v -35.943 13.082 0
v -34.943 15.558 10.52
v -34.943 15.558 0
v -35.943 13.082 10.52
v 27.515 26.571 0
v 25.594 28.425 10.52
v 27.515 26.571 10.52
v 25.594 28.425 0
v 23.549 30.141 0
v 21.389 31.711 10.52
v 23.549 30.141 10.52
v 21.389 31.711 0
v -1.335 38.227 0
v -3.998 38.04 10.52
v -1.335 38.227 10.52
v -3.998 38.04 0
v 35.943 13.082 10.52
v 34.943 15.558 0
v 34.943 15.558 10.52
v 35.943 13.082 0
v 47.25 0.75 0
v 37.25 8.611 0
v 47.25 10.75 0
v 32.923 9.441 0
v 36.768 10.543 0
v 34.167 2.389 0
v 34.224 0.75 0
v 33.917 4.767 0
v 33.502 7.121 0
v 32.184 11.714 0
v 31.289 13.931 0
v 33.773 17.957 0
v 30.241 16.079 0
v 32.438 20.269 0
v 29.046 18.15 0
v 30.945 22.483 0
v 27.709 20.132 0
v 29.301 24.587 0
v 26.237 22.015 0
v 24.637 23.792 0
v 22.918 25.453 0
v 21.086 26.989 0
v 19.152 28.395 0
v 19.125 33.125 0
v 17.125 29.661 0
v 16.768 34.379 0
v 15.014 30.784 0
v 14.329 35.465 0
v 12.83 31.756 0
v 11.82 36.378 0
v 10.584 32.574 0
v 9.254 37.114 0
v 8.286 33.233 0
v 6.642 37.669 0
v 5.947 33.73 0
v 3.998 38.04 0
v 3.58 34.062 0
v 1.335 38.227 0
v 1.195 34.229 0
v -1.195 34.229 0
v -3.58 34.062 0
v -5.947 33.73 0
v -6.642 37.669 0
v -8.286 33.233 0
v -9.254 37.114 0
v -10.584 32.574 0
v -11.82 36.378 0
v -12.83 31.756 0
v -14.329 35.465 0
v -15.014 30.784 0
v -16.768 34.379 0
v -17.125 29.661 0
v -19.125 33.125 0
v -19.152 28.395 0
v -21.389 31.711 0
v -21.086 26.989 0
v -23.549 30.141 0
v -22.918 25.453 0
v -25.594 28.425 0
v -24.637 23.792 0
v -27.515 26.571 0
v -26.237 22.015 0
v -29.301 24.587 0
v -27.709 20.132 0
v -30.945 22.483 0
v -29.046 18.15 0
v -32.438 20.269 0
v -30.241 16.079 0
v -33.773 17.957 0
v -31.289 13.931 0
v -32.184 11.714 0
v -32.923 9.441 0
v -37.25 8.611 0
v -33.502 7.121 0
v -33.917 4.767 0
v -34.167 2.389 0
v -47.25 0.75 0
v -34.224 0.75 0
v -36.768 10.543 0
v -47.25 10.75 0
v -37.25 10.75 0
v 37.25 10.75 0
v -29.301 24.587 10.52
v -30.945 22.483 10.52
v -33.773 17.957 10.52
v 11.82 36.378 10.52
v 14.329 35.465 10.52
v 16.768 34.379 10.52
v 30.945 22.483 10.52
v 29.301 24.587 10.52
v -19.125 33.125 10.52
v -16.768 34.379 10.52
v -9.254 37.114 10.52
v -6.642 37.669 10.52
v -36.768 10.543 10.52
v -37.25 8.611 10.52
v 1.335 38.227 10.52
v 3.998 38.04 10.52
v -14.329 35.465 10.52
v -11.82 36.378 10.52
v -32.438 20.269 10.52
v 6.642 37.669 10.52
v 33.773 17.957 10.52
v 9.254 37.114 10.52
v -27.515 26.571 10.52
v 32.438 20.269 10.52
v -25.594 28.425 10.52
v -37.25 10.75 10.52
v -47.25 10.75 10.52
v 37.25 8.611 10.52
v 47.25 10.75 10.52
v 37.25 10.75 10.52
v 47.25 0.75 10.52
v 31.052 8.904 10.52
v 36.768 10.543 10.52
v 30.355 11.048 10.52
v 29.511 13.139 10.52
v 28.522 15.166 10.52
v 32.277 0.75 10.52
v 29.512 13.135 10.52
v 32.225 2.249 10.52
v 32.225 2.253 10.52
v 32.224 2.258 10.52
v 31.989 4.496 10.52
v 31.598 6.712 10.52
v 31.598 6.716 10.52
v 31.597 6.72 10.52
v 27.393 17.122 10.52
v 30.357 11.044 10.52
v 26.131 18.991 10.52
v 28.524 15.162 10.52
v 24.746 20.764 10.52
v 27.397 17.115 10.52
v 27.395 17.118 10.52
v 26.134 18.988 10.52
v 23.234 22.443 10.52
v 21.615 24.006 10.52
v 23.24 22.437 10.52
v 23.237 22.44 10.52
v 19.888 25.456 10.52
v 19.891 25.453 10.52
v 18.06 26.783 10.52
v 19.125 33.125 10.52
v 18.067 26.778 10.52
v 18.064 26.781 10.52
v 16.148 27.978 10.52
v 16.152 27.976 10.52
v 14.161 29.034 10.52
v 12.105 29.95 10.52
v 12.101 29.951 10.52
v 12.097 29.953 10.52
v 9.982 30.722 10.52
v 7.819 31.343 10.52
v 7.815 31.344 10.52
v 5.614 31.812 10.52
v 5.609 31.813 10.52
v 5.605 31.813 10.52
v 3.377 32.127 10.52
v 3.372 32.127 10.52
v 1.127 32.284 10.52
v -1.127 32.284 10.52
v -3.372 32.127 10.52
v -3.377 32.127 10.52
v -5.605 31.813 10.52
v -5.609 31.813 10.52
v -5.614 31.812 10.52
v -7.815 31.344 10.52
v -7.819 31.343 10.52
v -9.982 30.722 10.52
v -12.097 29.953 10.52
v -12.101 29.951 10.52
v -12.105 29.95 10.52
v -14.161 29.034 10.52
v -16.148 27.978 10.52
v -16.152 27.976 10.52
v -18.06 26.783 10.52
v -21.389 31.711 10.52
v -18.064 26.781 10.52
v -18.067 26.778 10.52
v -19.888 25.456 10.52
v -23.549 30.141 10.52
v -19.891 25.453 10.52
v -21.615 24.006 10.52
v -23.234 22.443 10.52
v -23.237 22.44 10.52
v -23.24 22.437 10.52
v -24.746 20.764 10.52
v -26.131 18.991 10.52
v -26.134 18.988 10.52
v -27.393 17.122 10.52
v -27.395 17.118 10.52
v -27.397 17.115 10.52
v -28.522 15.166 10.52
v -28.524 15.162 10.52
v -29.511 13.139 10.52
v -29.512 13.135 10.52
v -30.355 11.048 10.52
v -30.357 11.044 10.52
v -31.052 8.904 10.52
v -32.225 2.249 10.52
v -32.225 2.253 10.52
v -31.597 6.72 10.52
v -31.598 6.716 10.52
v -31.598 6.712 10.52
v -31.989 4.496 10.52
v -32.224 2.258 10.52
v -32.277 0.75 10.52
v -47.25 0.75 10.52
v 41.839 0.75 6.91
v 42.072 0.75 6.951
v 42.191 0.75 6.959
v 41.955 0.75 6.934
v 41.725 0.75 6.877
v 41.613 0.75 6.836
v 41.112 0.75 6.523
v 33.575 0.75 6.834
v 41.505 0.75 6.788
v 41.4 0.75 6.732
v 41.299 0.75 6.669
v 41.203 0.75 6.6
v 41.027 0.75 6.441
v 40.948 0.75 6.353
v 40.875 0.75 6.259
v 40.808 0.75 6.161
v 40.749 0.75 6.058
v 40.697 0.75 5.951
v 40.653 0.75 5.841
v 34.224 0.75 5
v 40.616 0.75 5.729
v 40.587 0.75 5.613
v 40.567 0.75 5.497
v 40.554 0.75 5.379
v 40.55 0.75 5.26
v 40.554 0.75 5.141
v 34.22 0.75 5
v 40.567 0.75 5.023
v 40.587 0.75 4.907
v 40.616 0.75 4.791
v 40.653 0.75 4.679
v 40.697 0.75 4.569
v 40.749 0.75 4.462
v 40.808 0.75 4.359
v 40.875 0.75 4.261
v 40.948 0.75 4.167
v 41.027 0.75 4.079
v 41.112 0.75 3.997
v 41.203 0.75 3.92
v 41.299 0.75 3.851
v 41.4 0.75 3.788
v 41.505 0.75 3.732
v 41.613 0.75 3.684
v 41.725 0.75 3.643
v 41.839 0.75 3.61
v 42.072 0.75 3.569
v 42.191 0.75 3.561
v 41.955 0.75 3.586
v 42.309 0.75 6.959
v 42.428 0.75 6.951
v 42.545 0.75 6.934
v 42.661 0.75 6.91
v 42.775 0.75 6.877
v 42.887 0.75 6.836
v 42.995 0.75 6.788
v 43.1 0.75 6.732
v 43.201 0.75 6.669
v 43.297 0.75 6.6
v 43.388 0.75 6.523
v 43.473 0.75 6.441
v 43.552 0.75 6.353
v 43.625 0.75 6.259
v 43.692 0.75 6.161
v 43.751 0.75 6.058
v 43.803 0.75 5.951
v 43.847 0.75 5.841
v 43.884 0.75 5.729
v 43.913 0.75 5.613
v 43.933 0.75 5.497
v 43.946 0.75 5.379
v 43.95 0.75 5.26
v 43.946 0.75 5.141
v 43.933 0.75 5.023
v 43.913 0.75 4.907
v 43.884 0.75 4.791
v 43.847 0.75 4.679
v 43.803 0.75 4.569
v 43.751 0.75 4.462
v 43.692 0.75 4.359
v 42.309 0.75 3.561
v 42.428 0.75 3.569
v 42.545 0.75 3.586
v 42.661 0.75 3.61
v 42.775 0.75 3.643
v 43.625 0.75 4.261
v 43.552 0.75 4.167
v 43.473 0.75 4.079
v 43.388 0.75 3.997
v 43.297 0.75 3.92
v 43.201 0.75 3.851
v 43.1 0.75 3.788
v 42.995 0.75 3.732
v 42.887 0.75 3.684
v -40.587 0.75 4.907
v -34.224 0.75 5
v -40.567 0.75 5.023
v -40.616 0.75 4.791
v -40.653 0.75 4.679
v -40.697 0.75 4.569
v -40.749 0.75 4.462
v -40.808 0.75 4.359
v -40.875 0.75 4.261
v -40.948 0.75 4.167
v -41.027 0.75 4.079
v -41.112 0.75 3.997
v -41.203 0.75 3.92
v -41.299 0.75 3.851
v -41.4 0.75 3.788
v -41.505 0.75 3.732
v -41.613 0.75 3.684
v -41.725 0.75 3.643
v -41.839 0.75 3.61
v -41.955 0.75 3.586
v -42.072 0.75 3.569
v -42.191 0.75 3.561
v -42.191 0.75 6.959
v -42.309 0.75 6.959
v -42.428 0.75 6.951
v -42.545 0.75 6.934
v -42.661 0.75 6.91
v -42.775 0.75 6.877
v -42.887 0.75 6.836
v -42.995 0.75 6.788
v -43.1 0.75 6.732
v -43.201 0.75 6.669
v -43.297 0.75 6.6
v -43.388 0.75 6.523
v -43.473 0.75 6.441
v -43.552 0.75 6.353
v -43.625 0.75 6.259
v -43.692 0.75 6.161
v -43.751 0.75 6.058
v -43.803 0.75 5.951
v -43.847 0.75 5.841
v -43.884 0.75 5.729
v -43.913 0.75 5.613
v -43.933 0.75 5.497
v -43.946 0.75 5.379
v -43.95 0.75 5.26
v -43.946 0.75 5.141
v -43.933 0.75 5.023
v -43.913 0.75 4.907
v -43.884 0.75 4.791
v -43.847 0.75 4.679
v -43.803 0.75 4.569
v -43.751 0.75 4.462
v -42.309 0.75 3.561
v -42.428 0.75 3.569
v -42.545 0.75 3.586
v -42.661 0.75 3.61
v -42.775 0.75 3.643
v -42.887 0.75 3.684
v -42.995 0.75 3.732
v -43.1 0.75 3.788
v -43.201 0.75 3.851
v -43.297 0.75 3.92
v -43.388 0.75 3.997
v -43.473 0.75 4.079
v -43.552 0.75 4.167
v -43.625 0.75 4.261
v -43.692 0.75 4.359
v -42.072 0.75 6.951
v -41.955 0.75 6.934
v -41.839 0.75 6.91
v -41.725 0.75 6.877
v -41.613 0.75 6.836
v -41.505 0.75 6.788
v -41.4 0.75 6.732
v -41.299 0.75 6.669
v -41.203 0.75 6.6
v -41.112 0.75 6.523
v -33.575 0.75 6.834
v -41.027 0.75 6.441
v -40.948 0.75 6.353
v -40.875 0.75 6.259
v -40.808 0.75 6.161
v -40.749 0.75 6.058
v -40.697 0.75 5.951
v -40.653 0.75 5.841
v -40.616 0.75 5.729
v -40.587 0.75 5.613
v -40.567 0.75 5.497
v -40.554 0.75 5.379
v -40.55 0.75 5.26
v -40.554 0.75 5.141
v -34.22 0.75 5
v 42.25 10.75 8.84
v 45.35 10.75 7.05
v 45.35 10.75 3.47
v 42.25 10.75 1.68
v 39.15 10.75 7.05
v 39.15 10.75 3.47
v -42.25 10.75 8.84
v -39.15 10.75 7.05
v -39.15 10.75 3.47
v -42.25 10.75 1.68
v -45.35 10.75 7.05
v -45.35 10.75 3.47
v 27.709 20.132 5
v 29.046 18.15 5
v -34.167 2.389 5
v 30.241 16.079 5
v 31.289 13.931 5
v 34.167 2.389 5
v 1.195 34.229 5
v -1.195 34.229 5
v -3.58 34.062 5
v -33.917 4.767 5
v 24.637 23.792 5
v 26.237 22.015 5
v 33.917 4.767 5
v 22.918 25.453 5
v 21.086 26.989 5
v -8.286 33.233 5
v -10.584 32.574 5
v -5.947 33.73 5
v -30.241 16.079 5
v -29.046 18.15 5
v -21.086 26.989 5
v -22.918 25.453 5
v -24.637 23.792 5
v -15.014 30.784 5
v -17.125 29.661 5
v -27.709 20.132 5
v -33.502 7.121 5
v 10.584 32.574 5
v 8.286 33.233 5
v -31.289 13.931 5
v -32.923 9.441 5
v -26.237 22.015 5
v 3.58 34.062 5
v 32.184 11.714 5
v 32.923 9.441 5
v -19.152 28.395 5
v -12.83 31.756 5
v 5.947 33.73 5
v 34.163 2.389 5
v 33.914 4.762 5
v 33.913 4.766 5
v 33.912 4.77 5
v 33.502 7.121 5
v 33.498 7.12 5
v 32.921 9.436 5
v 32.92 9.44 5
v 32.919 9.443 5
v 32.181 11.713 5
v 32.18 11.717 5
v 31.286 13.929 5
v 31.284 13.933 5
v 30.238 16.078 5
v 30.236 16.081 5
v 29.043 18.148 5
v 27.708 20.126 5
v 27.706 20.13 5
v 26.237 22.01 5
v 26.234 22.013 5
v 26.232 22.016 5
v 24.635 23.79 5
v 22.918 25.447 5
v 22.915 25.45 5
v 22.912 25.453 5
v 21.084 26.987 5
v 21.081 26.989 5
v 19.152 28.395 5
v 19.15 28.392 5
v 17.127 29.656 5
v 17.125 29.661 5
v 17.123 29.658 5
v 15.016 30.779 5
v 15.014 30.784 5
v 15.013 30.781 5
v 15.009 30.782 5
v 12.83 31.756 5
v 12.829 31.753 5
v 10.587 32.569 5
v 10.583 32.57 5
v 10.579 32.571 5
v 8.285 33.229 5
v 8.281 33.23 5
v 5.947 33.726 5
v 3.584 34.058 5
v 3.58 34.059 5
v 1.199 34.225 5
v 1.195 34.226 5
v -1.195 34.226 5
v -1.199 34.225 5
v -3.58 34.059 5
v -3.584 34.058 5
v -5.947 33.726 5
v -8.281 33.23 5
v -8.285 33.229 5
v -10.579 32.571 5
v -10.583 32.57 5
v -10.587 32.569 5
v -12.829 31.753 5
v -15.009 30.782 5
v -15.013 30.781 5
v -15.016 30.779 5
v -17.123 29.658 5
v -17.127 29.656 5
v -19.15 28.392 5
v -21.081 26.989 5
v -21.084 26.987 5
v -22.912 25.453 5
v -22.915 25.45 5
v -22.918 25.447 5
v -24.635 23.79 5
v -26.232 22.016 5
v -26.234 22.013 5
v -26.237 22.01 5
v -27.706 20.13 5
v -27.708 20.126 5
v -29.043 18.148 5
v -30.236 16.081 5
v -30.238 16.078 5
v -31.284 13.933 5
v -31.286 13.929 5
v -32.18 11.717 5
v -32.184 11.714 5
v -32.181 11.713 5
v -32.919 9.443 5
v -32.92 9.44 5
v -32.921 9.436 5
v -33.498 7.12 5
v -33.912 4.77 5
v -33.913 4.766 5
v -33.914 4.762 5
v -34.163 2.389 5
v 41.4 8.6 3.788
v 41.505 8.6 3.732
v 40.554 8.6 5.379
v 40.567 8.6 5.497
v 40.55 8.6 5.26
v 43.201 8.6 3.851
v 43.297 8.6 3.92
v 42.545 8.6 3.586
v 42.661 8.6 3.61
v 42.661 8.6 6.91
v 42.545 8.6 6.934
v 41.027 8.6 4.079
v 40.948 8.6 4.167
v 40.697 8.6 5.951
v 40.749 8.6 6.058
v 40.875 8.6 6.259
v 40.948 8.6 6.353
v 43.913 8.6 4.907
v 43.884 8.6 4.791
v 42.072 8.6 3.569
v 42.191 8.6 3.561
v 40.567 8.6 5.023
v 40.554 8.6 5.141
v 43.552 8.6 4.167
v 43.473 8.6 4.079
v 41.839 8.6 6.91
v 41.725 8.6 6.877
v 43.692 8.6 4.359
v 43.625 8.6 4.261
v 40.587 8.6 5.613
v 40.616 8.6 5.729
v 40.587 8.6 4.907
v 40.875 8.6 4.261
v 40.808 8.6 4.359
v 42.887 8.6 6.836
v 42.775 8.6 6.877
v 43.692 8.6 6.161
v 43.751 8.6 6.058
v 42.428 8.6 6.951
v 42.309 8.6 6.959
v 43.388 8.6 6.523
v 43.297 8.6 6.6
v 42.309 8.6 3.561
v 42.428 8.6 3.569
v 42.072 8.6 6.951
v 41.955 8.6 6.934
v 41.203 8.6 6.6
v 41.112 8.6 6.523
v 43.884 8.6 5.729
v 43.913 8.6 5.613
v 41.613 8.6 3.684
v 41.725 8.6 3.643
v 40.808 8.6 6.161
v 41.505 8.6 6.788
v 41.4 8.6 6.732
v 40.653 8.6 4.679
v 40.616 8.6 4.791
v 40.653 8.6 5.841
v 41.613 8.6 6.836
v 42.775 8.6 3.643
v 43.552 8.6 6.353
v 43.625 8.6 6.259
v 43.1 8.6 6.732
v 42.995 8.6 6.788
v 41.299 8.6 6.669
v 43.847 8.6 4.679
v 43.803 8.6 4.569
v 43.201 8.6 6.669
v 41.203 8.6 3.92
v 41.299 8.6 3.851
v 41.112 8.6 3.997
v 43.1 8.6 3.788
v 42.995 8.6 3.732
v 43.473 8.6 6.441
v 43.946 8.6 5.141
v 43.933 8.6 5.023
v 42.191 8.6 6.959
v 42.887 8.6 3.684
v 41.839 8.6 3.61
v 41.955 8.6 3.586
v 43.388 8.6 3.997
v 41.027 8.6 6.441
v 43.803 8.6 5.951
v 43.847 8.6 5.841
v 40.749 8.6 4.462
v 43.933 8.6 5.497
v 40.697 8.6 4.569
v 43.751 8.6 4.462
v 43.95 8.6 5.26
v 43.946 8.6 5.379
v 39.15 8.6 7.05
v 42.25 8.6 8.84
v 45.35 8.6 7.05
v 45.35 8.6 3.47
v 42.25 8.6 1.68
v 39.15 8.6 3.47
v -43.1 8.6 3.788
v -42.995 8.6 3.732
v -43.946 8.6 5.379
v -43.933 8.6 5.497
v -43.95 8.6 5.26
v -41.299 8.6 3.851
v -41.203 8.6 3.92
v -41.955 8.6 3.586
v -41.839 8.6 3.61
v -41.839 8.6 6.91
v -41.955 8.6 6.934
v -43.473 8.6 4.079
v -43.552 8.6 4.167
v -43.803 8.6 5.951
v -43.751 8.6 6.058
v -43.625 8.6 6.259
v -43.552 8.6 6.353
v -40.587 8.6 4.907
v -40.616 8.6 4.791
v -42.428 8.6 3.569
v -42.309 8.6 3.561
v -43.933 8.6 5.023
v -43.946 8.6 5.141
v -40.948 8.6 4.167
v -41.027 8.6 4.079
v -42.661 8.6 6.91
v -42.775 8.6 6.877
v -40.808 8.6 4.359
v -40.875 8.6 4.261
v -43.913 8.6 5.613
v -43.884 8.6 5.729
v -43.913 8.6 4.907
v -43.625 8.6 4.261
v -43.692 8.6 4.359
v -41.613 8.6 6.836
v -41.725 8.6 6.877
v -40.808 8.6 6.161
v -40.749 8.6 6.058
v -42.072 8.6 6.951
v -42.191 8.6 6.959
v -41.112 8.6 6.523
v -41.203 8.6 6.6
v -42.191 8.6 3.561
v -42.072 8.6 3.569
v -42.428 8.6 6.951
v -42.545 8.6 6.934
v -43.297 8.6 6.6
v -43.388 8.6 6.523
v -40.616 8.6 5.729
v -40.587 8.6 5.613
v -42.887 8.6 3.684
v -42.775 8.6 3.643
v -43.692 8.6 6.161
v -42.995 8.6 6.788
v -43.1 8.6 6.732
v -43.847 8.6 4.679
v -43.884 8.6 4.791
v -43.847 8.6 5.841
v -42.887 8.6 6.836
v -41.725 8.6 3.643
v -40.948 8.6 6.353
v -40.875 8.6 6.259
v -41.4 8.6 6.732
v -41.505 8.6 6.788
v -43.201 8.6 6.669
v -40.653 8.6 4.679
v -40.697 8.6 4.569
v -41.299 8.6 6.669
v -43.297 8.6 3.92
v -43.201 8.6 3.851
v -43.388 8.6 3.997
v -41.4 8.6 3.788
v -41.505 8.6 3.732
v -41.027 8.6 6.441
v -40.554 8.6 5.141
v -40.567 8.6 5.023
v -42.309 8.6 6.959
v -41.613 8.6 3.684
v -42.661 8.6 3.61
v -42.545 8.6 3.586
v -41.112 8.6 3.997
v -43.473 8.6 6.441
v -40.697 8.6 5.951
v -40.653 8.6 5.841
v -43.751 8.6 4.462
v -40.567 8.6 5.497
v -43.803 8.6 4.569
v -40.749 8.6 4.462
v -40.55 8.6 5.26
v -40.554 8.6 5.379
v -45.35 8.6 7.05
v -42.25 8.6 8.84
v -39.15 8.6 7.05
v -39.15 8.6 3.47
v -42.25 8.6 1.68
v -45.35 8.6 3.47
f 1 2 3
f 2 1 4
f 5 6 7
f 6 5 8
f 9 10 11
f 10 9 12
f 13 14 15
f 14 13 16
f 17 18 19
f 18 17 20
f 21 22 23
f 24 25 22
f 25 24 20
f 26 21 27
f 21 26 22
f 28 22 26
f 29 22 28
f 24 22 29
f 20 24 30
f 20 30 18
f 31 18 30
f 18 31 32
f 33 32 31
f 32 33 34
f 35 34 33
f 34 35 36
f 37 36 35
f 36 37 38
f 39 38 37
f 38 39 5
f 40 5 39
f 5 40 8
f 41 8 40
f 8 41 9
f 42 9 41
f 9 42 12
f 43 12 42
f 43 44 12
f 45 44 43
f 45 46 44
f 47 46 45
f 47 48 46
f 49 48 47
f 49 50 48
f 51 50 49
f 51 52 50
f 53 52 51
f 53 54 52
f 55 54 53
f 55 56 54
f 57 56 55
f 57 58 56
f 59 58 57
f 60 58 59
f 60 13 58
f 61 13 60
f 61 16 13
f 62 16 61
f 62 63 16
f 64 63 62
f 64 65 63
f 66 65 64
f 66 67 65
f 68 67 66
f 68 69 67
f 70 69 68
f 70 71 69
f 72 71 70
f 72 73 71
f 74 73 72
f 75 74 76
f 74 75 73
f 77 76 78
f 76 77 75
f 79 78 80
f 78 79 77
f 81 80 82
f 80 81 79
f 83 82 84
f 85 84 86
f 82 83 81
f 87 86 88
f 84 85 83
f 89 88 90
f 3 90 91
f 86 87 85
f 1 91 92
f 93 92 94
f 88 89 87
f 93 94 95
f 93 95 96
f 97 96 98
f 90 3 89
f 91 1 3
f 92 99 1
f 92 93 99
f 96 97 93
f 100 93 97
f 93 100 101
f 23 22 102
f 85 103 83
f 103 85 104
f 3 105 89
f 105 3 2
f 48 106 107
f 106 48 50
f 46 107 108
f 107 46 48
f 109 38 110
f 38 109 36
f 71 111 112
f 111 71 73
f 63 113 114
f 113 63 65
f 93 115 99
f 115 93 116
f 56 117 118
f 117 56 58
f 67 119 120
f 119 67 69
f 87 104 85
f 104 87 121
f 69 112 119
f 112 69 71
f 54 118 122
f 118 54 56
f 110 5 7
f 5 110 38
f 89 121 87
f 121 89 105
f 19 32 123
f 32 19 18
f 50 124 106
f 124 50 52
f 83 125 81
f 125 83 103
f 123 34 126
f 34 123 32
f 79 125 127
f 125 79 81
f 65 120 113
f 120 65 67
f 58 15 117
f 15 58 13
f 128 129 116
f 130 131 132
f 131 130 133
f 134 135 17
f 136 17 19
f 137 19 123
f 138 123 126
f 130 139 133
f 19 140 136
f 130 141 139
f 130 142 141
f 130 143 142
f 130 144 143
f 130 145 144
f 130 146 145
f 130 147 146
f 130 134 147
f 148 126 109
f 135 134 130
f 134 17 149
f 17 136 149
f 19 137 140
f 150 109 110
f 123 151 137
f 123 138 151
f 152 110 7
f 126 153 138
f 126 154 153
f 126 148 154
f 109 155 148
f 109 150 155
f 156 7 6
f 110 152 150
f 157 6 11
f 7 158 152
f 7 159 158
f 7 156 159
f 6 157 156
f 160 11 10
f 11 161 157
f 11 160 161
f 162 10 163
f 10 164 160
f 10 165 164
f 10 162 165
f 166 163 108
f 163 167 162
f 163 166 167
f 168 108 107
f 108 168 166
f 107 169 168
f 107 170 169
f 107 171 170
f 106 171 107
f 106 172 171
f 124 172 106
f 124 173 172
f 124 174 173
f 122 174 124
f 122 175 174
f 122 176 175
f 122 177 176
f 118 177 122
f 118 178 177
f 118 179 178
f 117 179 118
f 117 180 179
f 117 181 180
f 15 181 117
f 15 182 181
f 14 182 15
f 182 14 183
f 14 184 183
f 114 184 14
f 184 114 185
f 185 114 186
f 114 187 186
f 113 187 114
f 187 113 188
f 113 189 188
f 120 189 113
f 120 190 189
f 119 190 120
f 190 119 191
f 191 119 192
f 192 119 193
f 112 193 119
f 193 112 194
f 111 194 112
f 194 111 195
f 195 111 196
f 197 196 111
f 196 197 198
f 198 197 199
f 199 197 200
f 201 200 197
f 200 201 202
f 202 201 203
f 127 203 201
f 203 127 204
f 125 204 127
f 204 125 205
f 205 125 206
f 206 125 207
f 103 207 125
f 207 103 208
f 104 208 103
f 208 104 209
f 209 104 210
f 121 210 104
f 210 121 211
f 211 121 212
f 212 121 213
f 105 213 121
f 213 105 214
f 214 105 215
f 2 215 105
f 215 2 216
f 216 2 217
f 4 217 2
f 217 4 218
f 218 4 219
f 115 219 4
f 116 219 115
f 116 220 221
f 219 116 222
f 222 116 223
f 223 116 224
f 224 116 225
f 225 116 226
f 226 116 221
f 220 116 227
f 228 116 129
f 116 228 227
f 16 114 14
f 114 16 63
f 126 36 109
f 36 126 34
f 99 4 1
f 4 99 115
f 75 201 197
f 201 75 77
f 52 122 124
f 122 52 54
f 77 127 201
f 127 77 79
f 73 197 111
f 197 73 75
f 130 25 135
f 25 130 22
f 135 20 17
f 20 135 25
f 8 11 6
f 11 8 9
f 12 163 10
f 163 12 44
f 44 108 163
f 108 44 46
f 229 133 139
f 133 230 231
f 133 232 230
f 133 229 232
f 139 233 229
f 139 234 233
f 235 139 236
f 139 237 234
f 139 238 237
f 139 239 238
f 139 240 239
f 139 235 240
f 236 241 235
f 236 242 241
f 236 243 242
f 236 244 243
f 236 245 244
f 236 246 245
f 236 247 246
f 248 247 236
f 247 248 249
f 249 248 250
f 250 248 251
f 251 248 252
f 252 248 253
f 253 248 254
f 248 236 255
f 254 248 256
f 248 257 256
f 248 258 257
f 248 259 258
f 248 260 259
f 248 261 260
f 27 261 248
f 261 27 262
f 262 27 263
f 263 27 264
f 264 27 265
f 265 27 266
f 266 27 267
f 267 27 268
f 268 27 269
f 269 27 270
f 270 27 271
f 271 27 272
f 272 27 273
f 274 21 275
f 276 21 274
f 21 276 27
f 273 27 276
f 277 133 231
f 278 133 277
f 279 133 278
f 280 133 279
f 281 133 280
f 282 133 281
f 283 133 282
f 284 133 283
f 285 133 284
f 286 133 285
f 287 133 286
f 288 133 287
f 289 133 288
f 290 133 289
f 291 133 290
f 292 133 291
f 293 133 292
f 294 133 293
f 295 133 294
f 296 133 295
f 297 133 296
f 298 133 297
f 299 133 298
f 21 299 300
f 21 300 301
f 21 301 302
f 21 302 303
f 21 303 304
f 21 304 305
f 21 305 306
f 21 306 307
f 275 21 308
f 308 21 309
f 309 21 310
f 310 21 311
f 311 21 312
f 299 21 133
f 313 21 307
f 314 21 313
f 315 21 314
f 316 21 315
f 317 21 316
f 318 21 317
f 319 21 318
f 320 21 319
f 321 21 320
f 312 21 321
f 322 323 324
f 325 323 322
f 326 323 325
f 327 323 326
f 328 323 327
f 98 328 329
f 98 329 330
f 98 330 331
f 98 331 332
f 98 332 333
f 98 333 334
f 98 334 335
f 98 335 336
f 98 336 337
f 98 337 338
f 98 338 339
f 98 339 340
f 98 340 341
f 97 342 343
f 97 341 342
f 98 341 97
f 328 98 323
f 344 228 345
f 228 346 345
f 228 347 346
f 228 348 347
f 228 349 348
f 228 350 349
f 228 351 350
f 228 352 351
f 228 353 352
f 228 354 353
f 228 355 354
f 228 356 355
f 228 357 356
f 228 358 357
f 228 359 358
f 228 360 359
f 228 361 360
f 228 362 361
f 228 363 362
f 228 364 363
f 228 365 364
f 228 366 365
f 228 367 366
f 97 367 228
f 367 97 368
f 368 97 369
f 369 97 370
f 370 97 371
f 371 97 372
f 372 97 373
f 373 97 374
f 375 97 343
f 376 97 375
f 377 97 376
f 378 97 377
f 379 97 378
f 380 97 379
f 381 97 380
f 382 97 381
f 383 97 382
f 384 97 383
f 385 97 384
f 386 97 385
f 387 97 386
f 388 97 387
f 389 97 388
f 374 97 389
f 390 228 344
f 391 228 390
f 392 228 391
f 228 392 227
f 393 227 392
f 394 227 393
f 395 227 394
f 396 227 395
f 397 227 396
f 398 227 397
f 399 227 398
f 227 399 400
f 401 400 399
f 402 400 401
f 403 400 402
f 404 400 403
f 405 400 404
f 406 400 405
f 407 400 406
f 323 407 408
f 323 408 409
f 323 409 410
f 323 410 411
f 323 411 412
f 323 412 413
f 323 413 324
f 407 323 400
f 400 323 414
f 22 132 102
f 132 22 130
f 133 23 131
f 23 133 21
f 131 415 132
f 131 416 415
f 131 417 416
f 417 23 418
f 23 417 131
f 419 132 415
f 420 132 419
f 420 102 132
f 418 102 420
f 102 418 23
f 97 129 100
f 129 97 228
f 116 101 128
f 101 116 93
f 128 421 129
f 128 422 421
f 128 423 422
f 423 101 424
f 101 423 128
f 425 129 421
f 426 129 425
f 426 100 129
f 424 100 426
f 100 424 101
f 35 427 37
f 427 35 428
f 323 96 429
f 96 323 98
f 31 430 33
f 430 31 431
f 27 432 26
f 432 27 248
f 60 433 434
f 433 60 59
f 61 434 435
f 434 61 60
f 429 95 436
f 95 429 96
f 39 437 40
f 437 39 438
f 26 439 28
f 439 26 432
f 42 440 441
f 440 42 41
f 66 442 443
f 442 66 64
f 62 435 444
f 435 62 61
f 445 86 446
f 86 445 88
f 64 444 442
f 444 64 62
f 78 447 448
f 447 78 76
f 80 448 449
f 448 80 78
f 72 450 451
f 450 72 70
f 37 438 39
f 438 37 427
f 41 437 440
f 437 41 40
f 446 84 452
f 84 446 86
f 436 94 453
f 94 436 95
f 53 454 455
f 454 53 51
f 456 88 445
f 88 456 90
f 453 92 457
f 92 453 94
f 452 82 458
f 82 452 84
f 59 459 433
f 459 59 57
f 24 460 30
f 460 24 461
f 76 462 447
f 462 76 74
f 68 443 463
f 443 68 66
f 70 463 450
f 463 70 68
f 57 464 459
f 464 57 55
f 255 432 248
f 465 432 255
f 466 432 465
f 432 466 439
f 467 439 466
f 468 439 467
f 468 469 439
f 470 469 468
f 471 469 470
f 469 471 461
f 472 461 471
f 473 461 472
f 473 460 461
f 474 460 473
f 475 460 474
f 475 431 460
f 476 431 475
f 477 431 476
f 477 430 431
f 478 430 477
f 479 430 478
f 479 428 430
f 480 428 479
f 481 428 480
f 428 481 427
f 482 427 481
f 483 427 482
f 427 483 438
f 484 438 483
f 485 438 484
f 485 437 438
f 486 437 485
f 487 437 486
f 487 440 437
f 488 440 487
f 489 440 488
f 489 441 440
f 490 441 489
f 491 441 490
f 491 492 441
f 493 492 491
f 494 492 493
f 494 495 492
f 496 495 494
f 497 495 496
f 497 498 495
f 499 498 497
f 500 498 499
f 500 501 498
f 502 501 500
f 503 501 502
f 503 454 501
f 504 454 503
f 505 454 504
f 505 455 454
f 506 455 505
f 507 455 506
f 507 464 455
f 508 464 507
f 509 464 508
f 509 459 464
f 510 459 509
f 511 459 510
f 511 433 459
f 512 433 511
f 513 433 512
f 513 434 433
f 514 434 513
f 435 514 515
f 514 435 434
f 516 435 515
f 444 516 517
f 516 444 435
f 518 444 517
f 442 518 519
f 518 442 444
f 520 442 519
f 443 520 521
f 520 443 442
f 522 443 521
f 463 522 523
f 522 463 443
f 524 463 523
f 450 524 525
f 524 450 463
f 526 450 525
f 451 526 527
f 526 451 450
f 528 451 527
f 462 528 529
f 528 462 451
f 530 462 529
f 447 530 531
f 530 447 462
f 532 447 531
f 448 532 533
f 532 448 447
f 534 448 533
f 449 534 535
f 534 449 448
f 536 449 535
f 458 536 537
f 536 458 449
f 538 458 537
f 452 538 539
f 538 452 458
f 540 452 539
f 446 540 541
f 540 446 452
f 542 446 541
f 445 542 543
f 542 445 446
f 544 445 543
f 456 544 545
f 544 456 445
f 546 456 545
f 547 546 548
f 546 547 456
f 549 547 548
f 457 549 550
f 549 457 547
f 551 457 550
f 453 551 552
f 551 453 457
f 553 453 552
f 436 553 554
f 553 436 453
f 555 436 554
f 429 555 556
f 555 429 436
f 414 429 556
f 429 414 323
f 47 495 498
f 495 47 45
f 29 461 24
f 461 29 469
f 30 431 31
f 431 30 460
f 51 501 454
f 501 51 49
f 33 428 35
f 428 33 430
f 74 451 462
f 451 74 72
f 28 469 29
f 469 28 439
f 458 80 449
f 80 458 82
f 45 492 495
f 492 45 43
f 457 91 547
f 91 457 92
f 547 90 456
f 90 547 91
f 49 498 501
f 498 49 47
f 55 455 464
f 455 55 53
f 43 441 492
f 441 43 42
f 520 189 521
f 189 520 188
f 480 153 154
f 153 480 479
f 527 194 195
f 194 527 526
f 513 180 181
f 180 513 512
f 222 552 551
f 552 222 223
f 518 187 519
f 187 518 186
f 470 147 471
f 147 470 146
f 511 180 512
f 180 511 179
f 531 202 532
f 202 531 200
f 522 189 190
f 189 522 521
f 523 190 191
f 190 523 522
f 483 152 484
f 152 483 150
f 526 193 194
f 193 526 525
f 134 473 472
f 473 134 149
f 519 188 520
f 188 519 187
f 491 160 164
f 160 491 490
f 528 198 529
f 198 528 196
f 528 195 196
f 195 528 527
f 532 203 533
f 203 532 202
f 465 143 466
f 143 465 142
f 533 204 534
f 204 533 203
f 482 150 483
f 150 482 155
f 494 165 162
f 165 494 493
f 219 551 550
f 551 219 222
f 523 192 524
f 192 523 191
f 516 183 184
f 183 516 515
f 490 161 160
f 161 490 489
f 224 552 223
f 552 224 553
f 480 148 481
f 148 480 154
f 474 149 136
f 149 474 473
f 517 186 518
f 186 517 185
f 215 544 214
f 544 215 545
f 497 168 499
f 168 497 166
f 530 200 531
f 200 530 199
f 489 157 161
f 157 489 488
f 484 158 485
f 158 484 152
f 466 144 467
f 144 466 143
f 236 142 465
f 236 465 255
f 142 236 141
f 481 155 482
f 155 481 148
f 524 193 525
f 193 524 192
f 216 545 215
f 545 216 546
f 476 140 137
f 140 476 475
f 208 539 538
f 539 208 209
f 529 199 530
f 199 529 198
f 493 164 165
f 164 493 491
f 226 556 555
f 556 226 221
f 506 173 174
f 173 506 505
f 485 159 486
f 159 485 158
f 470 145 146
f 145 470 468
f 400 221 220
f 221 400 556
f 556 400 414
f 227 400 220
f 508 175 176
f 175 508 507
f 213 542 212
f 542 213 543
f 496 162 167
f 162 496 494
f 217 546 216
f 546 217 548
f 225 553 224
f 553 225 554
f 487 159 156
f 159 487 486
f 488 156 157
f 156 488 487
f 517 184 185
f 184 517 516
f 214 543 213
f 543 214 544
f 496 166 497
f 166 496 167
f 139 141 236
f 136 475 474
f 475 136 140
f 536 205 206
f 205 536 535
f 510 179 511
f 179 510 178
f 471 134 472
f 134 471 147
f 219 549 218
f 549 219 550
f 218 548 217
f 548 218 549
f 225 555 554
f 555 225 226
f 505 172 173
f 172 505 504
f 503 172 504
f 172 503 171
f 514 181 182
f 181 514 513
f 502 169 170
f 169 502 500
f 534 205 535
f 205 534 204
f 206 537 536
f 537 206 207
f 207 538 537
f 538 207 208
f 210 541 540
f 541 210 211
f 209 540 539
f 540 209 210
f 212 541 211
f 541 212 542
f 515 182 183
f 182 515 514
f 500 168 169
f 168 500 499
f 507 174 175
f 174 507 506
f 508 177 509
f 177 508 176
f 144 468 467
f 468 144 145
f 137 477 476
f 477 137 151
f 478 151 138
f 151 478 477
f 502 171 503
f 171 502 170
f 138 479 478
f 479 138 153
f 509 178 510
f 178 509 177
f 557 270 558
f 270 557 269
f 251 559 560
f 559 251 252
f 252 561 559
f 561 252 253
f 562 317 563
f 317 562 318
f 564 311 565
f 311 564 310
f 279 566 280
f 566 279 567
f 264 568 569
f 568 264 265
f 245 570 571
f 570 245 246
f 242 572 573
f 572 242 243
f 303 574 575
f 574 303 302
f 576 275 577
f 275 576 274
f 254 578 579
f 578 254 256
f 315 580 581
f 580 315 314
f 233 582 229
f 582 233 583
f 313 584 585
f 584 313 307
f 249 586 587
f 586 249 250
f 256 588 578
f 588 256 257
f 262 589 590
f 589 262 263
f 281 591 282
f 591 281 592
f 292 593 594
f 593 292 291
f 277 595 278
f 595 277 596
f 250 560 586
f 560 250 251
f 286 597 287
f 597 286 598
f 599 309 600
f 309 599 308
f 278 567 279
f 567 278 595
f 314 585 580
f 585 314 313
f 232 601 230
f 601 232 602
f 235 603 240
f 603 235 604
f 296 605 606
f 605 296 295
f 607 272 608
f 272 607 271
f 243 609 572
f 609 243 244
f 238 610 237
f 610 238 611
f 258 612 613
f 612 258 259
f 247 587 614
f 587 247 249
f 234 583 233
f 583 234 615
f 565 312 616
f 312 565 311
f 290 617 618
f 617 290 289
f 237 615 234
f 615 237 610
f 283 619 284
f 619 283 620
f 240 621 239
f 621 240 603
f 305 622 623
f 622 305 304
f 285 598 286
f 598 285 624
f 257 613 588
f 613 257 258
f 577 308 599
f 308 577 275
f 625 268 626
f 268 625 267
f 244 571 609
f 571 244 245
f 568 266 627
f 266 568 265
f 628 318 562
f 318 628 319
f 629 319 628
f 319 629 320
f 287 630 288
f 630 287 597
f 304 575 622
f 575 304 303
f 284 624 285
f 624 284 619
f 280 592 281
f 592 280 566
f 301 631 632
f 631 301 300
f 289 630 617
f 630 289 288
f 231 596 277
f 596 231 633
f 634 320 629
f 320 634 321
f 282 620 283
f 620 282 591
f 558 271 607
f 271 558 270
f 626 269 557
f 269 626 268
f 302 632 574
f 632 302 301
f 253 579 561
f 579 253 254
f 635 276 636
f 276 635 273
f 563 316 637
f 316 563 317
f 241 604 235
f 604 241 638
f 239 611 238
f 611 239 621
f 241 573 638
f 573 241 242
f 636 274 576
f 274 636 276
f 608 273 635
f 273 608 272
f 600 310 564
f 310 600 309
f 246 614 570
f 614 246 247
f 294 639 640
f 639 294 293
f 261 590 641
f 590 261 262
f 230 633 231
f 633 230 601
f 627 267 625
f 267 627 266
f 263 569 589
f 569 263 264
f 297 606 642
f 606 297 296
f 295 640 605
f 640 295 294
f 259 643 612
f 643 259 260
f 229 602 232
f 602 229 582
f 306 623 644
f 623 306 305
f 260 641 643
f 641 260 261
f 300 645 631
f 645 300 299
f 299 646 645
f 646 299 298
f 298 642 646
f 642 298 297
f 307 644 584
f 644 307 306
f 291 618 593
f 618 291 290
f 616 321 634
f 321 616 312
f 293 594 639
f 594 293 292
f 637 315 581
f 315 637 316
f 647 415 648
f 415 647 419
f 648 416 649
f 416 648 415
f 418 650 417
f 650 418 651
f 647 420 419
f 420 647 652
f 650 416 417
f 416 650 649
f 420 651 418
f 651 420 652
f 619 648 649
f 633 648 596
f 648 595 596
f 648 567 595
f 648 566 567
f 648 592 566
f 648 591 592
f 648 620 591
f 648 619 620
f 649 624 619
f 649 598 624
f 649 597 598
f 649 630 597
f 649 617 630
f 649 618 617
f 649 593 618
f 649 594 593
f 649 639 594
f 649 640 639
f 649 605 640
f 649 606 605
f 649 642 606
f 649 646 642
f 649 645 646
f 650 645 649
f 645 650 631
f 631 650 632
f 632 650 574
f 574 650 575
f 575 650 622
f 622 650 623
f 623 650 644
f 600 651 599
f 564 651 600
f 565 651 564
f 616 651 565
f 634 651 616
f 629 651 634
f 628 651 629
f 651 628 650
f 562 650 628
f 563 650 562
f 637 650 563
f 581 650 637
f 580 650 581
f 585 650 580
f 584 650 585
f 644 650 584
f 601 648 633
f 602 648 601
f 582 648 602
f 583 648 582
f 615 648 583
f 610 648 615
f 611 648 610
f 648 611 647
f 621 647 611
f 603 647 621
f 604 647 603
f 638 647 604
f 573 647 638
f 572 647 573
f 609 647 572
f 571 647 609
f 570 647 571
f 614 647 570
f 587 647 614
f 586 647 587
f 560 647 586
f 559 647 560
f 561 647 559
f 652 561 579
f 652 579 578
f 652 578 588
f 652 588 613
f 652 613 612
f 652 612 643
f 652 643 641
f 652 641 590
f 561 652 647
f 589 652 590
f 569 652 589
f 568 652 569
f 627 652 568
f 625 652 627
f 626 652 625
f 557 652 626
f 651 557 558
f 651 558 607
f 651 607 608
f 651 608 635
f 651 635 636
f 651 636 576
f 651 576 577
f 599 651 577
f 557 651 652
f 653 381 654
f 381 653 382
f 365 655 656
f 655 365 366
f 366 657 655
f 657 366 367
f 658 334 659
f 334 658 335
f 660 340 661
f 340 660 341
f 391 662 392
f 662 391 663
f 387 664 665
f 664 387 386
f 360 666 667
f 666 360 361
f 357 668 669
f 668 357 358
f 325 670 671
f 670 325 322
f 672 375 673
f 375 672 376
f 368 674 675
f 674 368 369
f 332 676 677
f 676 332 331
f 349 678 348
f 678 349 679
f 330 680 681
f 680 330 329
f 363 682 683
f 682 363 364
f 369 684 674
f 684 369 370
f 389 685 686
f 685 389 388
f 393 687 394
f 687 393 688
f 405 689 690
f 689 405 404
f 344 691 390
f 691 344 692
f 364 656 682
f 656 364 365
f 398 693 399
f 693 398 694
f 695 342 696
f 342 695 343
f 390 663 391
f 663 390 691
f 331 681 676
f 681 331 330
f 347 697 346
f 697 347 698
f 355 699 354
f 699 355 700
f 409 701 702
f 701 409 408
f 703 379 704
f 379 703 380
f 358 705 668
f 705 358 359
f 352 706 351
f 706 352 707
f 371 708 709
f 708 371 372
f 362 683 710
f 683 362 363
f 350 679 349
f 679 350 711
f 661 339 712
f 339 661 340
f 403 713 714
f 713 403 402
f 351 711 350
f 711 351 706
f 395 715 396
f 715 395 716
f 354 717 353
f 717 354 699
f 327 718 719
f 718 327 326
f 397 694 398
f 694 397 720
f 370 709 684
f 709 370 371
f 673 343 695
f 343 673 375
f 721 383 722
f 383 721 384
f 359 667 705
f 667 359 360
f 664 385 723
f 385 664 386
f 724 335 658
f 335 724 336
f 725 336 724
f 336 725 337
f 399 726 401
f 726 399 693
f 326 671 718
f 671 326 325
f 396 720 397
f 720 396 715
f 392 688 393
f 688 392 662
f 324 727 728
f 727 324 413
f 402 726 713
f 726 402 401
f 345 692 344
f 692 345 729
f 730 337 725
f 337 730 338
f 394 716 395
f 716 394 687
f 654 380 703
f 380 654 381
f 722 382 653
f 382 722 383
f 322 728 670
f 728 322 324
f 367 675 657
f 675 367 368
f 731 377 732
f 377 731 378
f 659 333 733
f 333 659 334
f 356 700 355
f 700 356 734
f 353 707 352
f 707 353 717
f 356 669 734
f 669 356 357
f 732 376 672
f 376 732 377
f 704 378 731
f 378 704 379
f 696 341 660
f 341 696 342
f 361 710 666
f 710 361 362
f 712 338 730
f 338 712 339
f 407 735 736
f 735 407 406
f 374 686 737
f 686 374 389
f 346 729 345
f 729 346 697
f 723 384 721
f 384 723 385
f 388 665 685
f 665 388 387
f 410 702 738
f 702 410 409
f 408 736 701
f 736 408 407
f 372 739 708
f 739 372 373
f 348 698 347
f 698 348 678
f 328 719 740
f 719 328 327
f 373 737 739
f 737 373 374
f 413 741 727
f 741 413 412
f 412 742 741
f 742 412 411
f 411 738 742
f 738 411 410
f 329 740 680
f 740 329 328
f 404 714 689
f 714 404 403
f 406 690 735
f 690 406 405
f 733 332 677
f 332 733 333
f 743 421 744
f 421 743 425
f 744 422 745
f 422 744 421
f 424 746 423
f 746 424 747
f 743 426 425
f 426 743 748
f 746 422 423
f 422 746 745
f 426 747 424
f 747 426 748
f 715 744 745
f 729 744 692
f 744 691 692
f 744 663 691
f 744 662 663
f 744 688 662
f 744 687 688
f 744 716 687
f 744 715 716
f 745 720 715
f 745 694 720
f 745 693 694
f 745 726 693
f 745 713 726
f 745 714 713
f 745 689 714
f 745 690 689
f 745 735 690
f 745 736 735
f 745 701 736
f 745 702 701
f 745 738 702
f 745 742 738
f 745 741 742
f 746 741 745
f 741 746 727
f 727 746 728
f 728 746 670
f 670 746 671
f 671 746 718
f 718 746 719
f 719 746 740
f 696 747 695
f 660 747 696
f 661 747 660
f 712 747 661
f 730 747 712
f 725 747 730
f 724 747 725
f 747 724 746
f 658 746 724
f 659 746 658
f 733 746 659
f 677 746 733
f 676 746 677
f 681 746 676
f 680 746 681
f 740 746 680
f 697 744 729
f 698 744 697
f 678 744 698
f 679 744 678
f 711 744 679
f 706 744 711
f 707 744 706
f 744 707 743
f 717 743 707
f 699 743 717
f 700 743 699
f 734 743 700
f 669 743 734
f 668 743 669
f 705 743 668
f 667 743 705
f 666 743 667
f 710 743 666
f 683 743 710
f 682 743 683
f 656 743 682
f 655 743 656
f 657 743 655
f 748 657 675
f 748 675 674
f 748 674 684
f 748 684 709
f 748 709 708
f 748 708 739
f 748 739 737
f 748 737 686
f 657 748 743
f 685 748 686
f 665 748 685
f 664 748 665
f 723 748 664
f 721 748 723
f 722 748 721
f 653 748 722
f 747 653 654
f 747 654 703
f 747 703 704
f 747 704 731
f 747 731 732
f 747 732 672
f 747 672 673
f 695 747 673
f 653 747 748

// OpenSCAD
// ===================================================================
// BMeters GSD8-RFM DN20 - Low-Profile (45-50mm) Tower for XIAO ESP32S3 Sense
// ===================================================================

$fn = 90;

// --- Part Selector ---
part = "clamp"; // ["assembled", "tower", "clamp"]

// --- Meter Dimensions (Calibrated) ---
d_top       = 64.6;   // Top rim inner bore (measured 64.34mm + clearance)
d_shelf     = 68.5;   // Lower skirt inner bore (measured 68.11mm + clearance)
h_drop      = 5.52;   // Drop height to the shelf
h_skirt     = 5.0;    // Skirt height below shelf
collar_h    = h_drop + h_skirt; // Total collar height (~10.5mm)

wall_th     = 4.0;
r_out       = (d_shelf / 2) + wall_th;
clamp_gap   = 1.5;    // Mating gap per side for tension

// --- Elevation & Tower ---
tower_h     = 45.0;   // Lens/plate height above meter base (~50mm total)
leg_w       = 8.0;    // Support strut width
leg_th      = 3.5;    // Strut thickness

// --- Seeed Studio XIAO ESP32S3 Sense Cradle ---
xiao_w      = 18.2;   // Board width (+ tolerance)
xiao_l      = 21.5;   // Board length (+ tolerance)
xiao_depth  = 4.5;    // Depth for board + camera daughterboard sandwich
lens_dia    = 9.5;    // Lens through-hole
tray_wall   = 2.5;

tray_ext_w  = xiao_w + (tray_wall * 2);
tray_ext_l  = xiao_l + (tray_wall * 2);

// --- Fasteners (M3) ---
bolt_d      = 3.4;
nut_w       = 6.2;
nut_h       = 2.8;
lug_w       = 10.0;

// ===================================================================
// Top-Level Assembly Dispatcher
// ===================================================================

if (part == "assembled") {
    color("DimGray") tower_half();
    color("SlateGray") clamp_half();
} else if (part == "tower") {
    tower_half();
} else if (part == "clamp") {
    rotate([0, 0, 180]) clamp_half();
}

// ===================================================================
// Module: Tower Half (Collar + Struts + XIAO Tray)
// ===================================================================
module tower_half() {
    difference() {
        union() {
            // Front collar half
            intersection() {
                cylinder(r = r_out, h = collar_h);
                translate([-r_out - 10, clamp_gap / 2, 0])
                    cube([(r_out + 10) * 2, r_out + 10, collar_h]);
            }
            collar_lugs(rear = false);

            // Angled support struts
            support_leg(angle = 45, with_wire_channel = true);
            support_leg(angle = 135, with_wire_channel = false);

            // Elevated XIAO Sense Platform
            translate([0, 8.0, tower_h]) // 8mm forward offset to center over numbers
                xiao_tray();
        }

        // Calibrated stepped bore
        stepped_meter_bore();

        // M3 bolt holes
        lug_holes(rear = false);
    }
}

// ===================================================================
// Module: Clamp Half (Rear Collar)
// ===================================================================
module clamp_half() {
    difference() {
        union() {
            // Rear collar half
            intersection() {
                cylinder(r = r_out, h = collar_h);
                translate([-r_out - 10, -r_out - 10 - (clamp_gap / 2), 0])
                    cube([(r_out + 10) * 2, r_out + 10, collar_h]);
            }
            collar_lugs(rear = true);
        }

        stepped_meter_bore();
        lug_holes(rear = true);
    }
}

// ===================================================================
// Internal Geometry & Mechanical Features
// ===================================================================

module stepped_meter_bore() {
    // 1. Lower wide skirt
    translate([0, 0, -1])
        cylinder(d = d_shelf, h = h_skirt + 1);

    // 2. Smooth internal transition up the drop
    translate([0, 0, h_skirt - 0.01])
        cylinder(d1 = d_shelf, d2 = d_top, h = h_drop + 0.02);

    // 3. Top rim clearance
    translate([0, 0, h_skirt + h_drop])
        cylinder(d = d_top, h = collar_h);
}

module collar_lugs(rear = false) {
    y_sign = rear ? -1 : 1;
    for (x_dir = [-1, 1]) {
        translate([x_dir * (r_out + lug_w / 2 - 1), y_sign * (clamp_gap / 2 + 5), collar_h / 2])
            cube([lug_w, 10, collar_h], center = true);
    }
}

module lug_holes(rear = false) {
    y_sign = rear ? -1 : 1;
    for (x_dir = [-1, 1]) {
        translate([x_dir * (r_out + lug_w / 2 - 1), 0, collar_h / 2])
            rotate([90, 0, 0])
            cylinder(d = bolt_d, h = 40, center = true);

        if (rear) {
            translate([x_dir * (r_out + lug_w / 2 - 1), -10.5, collar_h / 2])
                rotate([90, 30, 0])
                cylinder(r = nut_w / (2 * cos(30)), h = nut_h + 1, $fn = 6, center = true);
        }
    }
}

module support_leg(angle, with_wire_channel = false) {
    bx = (r_out - 1) * cos(angle);
    by = (r_out - 1) * sin(angle);
    tx = (tray_ext_w / 2 - 2) * cos(angle);
    ty = 8.0 + (tray_ext_l / 2 - 2) * sin(angle);

    difference() {
        hull() {
            translate([bx, by, collar_h - 1])
                cylinder(r = leg_w / 2, h = 1);
            translate([tx, ty, tower_h])
                cylinder(r = leg_w / 2, h = 1);
        }
        
        // Optional 2.5mm groove along the strut for IR cap wiring
        if (with_wire_channel) {
            hull() {
                translate([bx * 0.95, by * 0.95, collar_h])
                    cylinder(d = 2.5, h = 2);
                translate([tx * 0.95, ty * 0.95, tower_h - 1])
                    cylinder(d = 2.5, h = 2);
            }
        }
    }
}

module xiao_tray() {
    difference() {
        // Outer tray body
        translate([-tray_ext_w / 2, -tray_ext_l / 2, 0])
            cube([tray_ext_w, tray_ext_l, xiao_depth + 2.0]);

        // Pocket for XIAO S3 Sense
        translate([-xiao_w / 2, -xiao_l / 2, 2.0])
            cube([xiao_w, xiao_l, xiao_depth + 1.0]);

        // Central aperture for the downward-facing lens
        translate([0, 0, -1])
            cylinder(d = lens_dia, h = 6.0);

        // Horizontal rear cutout for USB-C connector
        translate([-5.5, tray_ext_l / 2 - 4, 2.0])
            cube([11.0, 6.0, xiao_depth + 1.0]);
    }
}
